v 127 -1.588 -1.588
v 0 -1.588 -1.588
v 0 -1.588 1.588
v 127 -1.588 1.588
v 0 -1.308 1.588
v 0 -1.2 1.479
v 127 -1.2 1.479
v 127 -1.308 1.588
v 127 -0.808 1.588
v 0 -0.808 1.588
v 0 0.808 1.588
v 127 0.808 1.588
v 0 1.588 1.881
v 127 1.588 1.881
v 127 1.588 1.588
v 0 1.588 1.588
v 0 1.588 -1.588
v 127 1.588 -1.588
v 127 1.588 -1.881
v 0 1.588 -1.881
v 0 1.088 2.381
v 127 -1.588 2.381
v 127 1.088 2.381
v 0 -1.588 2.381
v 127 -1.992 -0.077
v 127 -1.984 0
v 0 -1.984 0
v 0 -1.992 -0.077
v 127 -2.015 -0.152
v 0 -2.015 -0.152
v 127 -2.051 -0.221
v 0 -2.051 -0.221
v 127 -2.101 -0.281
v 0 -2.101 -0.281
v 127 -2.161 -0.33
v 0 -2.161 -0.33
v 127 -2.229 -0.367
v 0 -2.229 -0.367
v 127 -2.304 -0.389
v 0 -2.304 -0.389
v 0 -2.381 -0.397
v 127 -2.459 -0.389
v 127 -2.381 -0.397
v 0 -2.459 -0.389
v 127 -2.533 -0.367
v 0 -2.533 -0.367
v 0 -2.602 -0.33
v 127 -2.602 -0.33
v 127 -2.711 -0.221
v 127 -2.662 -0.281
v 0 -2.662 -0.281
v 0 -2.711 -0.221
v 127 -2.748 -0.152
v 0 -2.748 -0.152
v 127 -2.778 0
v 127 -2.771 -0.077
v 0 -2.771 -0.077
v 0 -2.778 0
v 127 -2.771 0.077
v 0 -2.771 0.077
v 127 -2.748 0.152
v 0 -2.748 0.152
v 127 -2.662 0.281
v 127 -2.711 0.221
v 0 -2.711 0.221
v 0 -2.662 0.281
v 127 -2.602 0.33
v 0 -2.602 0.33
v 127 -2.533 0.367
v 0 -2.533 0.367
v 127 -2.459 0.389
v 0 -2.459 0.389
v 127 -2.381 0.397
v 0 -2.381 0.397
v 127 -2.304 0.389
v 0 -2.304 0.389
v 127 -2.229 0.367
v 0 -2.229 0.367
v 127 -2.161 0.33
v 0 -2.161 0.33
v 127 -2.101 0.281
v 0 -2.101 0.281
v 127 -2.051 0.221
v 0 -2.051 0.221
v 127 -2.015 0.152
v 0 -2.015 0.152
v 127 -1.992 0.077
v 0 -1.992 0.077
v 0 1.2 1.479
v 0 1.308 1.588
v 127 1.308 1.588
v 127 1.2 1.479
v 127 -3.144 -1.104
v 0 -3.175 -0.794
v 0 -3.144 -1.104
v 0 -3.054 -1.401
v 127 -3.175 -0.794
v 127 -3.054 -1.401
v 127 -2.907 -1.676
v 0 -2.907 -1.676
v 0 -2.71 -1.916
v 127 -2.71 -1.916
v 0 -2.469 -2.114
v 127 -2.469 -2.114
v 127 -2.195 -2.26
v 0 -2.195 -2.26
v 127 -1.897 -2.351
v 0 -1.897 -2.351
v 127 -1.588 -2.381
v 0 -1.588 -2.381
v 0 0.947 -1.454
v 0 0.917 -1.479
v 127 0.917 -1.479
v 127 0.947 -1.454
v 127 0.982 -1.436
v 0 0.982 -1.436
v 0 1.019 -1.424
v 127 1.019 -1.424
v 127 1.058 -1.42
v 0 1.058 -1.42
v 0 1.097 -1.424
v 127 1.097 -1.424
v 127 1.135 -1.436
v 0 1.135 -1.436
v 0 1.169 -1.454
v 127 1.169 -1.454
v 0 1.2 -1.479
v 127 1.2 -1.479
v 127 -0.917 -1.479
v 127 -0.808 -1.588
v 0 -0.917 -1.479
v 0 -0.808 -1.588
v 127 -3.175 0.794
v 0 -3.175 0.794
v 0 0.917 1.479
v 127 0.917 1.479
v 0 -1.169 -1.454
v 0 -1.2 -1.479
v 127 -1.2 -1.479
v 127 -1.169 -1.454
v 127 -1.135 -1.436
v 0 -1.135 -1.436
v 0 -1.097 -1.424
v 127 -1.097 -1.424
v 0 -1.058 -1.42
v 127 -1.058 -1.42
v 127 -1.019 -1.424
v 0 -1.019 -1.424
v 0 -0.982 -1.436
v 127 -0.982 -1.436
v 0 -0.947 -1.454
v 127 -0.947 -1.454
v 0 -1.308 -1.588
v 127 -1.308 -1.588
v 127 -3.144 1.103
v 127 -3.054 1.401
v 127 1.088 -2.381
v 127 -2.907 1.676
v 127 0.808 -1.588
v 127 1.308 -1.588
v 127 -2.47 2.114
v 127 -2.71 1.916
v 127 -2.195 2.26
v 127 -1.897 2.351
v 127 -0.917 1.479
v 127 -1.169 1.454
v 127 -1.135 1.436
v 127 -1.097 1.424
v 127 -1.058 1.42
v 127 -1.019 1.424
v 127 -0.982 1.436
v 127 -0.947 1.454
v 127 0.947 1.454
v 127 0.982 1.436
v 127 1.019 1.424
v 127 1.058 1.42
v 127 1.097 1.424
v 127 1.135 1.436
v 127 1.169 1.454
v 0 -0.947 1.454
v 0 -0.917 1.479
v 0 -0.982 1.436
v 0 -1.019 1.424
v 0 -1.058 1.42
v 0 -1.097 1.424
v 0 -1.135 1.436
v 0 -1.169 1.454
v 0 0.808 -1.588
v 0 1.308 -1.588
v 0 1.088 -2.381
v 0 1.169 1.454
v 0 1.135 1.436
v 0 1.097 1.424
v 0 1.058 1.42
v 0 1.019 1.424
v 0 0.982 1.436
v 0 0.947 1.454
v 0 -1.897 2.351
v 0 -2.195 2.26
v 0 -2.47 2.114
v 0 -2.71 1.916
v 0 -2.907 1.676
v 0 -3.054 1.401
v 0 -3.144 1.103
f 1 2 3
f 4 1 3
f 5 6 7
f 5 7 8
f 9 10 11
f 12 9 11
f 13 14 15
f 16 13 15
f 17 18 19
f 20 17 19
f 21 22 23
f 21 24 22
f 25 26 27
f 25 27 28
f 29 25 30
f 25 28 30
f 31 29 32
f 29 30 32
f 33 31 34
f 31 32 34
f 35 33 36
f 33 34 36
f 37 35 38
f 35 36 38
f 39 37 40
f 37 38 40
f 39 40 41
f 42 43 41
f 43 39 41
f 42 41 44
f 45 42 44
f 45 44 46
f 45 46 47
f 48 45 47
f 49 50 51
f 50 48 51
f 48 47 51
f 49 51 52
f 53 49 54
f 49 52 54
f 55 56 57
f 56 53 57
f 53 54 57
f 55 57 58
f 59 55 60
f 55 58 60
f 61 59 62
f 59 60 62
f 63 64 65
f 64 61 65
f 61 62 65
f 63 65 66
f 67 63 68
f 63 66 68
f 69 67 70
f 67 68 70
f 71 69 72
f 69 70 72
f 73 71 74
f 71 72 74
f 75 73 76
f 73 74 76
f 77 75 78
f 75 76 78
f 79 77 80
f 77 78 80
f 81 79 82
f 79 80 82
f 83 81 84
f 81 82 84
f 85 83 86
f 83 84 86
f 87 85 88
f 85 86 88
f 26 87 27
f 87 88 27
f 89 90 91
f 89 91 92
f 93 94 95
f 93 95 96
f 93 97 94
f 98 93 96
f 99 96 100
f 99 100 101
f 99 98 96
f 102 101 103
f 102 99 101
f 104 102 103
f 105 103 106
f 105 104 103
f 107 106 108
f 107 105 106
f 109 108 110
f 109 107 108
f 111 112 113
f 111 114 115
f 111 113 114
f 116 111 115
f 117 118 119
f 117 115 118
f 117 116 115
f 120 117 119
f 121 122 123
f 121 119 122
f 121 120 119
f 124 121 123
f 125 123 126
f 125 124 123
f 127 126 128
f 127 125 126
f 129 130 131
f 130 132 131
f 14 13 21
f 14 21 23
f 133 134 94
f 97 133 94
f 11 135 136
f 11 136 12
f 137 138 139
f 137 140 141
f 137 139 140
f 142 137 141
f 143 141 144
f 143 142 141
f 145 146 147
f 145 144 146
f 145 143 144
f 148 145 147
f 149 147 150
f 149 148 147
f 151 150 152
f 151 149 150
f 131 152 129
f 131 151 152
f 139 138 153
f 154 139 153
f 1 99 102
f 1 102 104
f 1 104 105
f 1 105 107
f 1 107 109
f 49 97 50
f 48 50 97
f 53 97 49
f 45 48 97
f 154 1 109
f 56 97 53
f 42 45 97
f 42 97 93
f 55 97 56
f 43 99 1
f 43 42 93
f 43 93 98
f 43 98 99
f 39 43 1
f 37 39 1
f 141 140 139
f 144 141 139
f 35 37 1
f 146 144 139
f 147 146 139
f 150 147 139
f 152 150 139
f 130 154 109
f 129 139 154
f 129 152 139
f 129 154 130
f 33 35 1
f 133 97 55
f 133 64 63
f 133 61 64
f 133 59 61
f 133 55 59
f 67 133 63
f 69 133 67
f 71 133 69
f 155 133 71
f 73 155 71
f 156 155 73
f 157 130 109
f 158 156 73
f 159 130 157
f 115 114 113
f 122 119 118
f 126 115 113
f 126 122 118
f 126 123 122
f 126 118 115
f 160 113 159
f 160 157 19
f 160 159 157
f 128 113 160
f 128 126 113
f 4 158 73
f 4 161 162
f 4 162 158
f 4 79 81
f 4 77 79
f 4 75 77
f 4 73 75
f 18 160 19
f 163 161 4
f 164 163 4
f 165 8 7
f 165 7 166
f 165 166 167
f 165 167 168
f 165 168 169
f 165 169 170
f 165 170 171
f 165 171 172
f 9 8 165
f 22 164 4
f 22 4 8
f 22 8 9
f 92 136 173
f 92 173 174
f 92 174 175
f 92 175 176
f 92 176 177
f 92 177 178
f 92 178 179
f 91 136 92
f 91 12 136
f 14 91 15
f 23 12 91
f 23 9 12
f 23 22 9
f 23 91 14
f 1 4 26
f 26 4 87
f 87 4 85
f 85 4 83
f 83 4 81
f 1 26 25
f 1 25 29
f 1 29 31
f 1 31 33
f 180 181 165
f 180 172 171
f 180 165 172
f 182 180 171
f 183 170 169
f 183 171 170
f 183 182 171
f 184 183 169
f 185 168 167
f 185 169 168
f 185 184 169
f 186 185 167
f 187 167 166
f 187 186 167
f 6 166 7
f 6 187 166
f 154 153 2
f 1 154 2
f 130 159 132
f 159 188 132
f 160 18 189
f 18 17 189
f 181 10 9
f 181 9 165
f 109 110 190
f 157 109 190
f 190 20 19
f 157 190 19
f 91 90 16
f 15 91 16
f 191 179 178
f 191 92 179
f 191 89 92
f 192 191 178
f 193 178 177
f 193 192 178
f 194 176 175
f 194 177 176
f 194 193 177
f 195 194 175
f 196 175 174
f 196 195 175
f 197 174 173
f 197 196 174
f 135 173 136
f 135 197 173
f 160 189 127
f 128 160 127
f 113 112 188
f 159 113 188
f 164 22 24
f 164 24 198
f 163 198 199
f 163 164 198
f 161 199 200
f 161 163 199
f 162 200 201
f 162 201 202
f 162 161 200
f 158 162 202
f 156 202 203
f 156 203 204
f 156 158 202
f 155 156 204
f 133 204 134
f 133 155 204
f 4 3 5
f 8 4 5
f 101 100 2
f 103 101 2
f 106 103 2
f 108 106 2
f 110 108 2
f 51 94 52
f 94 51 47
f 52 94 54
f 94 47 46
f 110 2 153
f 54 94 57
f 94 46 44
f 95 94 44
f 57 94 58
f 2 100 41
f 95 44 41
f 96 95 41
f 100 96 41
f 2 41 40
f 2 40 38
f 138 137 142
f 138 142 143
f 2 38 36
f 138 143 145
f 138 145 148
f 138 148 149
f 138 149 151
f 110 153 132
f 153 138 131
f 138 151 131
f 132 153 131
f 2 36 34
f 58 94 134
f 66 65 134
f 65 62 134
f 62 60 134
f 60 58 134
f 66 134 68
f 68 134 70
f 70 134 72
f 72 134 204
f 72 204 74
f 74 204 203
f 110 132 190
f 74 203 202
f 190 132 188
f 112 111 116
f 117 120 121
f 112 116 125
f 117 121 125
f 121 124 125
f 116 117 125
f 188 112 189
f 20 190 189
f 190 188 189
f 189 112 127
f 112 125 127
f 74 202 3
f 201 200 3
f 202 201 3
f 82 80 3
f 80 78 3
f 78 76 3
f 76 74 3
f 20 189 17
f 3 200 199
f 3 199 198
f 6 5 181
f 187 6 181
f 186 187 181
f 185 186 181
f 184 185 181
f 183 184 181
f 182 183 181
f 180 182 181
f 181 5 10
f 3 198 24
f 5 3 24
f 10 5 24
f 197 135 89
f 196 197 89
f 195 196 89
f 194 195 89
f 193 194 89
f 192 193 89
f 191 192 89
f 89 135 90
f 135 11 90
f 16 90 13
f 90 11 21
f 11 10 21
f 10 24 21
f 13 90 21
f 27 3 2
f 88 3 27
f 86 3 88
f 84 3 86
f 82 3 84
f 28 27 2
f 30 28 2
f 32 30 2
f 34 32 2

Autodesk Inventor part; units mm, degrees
ref_plane "YZ Plane" through (0, 0, 0) normal (1, 0, 0) x (0, 1, 0)
ref_plane "XZ Plane" through (0, 0, 0) normal (0, 1, 0) x (-1, 0, 0)
ref_plane "XY Plane" through (0, 0, 0) normal (0, 0, 1) x (1, 0, 0)
sketch "Sketch1" plane through (0, 0, 0) normal (1, 0, 0) x (0, 1, 0)
  line L0 (-1.5875, 1.5875) -> (1.5875, 1.5875)
  line L1 (1.5875, 1.5875) -> (1.5875, -1.5875) construction
  line L2 (1.5875, -1.5875) -> (-1.5875, -1.5875)
  line L3 (-1.5875, -1.5875) -> (-1.5875, 1.5875)
  line L4 (-1.5875, 1.5875) -> (1.5875, -1.5875) construction
  line L5 (1.5875, 1.5875) -> (-1.5875, -1.5875) construction
  line L6 (-1.5875, 2.3813) -> (1.5875, 2.3813)
  line L7 (1.5875, 2.3813) -> (1.5875, -2.3813)
  line L8 (1.5875, -2.3813) -> (-1.5875, -2.3813)
  line L9 (-1.5875, -2.3813) -> (-1.5875, 2.3813)
  line L10 (-1.5875, 2.3813) -> (1.5875, -2.3813) construction
  line L11 (1.5875, 2.3813) -> (-1.5875, -2.3813) construction
  line L12 (-1.5875, 2.3813) -> (-3.175, 2.3812)
  line L13 (-3.175, 2.3812) -> (-3.175, -2.3813)
  line L14 (-3.175, -2.3813) -> (-1.5875, -2.3813)
  line L15 (-1.5875, -2.3813) -> (-1.5875, 2.3813)
  line L16 (0.8083, 1.5875) -> (1.0583, 1.8375) construction
  line L17 (1.0583, 1.8375) -> (1.3083, 1.5875) construction
  line L18 (1.3083, 1.5875) -> (1.1998, 1.4789)
  line L19 (0.9169, 1.4789) -> (0.8083, 1.5875)
  line L20 (-0.8083, 1.5875) -> (-0.9169, 1.4789)
  line L21 (-1.1998, 1.4789) -> (-1.3083, 1.5875)
  line L22 (-1.3083, 1.5875) -> (-1.0583, 1.8375) construction
  line L23 (-1.0583, 1.8375) -> (-0.8083, 1.5875) construction
  line L24 (1.5875, 0) -> (-1.5875, 0) construction
  arc A0 (0.9169, 1.4789) -> (1.1998, 1.4789) centre (1.0583, 1.6203) ccw
  arc A1 (-1.1998, 1.4789) -> (-0.9169, 1.4789) centre (-1.0583, 1.6203) ccw
  line L25 (0.8083, -1.5875) -> (1.0583, -1.8375) construction
  line L26 (1.0583, -1.8375) -> (1.3083, -1.5875) construction
  line L27 (1.3083, -1.5875) -> (1.1998, -1.4789)
  line L28 (0.9169, -1.4789) -> (0.8083, -1.5875)
  line L29 (-0.8083, -1.5875) -> (-0.9169, -1.4789)
  line L30 (-1.1998, -1.4789) -> (-1.3083, -1.5875)
  line L31 (-1.3083, -1.5875) -> (-1.0583, -1.8375) construction
  line L32 (-1.0583, -1.8375) -> (-0.8083, -1.5875) construction
  arc A2 (1.1998, -1.4789) -> (0.9169, -1.4789) centre (1.0583, -1.6203) ccw
  arc A3 (-0.9169, -1.4789) -> (-1.1998, -1.4789) centre (-1.0583, -1.6203) ccw
  circle A4 centre (-2.3813, 0) radius 0.3969
  point P0 (0, 0)
  point P1 (1.0583, 1.5875)
  point P2 (1.0583, 1.3375)
  point P3 (-1.0583, 1.5875)
  point P4 (-1.0583, 1.3375)
  point P5 (1.0583, -1.5875)
  point P6 (1.0583, -1.3375)
  point P7 (-1.0583, -1.5875)
  point P8 (-1.0583, -1.3375)
  dimension "d0" = 3.175
  dimension "d1" = 3.175
  dimension "d2" = 3.175
  dimension "d3" = 4.7625
  dimension "d4" = 1.5875
  dimension "d5" = 0.5
  dimension "d6" = 0.5
  dimension "d7" = 0.2
  dimension "d14" = 0.7937
  dimension "d15" = 0.7937
extrude "Extrusion1" add sketch "Sketch1" along normal blind 127 contours L9 L6 L7 L0 | L3 L9 L14 L13 L12 | L0 L20 A1 L21 | L2 L7 L8 L9 | L30 A3 L29 L2 | L0 L18 A0 L19 | L28 A2 L27 L2
chamfer "Chamfer1" distance 0.5 angle 45 2 edges at (63.5, 1.5875, 2.3813) (63.5, 1.5875, -2.3813)
fillet "Fillet1" radius 1.5875 2 edges at (63.5, -3.175, 2.3812) (63.5, -3.175, -2.3813)
sketch "Sketch2" plane through (0, 1.0875, 2.3813) normal (0, 0, 1) x (1, 0, 0)
  line L0 (0, 0.1123) -> (127, 0.1123) projected
  line L1 (63.5, 0.1123) -> (63.5, -2.675)
  line L2 (0, -2.675) -> (127, -2.675) projected
  point P0 (0, -1.0875)
equation "\"d6\" = d5"
equation "\"d15\" = 0.5 * d4"
properties part number "Nomad Slot Filler" material "Silicon Nitride"
